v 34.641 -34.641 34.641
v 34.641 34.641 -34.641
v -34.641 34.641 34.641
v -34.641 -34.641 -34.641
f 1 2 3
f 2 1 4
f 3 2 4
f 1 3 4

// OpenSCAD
/*
  
   cubic system forms
   
   see http://kitwallace.tumblr.com/tagged/crystal 
   
   Kit Wallace October 2015
   
   doesnt work in Thiniverse customiser - preview is very small 
   
*/

form=5; // [0:cube,1:rhombic dodecahedron,2:tetrahexahedron,3:pentagonal dodecahedron,4:octahedron,5:tetrahedron,6:icositetrahedron,7:triakis tetrahedron,8:triakis octahedron,9:deltoid dodecahedron,10:hexakis octahedron,11:diakisdodecahedron,12:hexatetrahedron,13:pentagonal icositetrahedron,14:tetrahedral pentagonal dodecaheron]



/* [orientation] */
//experimentation needed since size varies with form
size=20; // [1:40] 

// basic functions

function flatten(l) = [ for (a = l) for (b = a) b ] ;

function vcontains(val,list) =
     search([val],list)[0] != [];
       
function distinct(list,dlist=[],i=0) =  // return only distinct items of list
      i==len(list)
         ? dlist
         : vcontains(list[i],dlist)
             ? distinct(list,dlist,i+1)
             : distinct(list,concat(dlist,[list[i]]),i+1)
      ;

function sum(list,i=0) =  
      i < len(list)
        ?  list[i] + sum(list,i+1)
        :  0;

// solid construction
  
module orient_to(centre, normal) {   
      translate(centre)
      rotate([0, 0, atan2(normal.y, normal.x)]) //rotation
      rotate([0, atan2(sqrt(pow(normal.x, 2)+pow(normal.y, 2)),normal.z), 0])
      children();
}

module face(normal, d=1, size=20) {
   orient_to([0,0,0],normal)
       translate([0,0, d + size/2])
            cube([10*size,10*size,size],center=true);
} 

module solid(faces,d=1,color="lightblue",size=5) {
 /* faces is a list of normals (Miller indices)
    d is either a scaler, the distance of each face from the origin or a list of distances, one for each face
 */  
 color(color)
    difference() {
     sphere(size,center=true);
     for(i = [0:len(faces)-1])  {
       face = faces[i];
       fd = len(d) == undef ? d : d[i];
       face(face,d=fd,size=size);
     }
 }
}

// functions to expand a form into faces using eg perms and combs

function perm3(l) =
// lazy until I code general perms with duplicates
 distinct(
   [[l[0],l[1],l[2]],
   [l[0],l[2],l[1]],
   [l[1],l[0],l[2]],
   [l[1],l[2],l[0]],
   [l[2],l[0],l[1]],
   [l[2],l[1],l[0]]
]);
        
function combs(list,n=0) =
   n < len(list)-1
   ? [for (j=list[n])
       for (sl= combs(list,n+1))
           concat(j,sl)
     ]
   : list[n] ;
 
       
function expand(list) =   
// needs a better name
  [for (x= list)
      x== 0 ? 0 : [x,-x]
  ];

// face generators
  
function shift(face,k=1) = [face[k%3],face[(k+1)%3],face[(k+2)%3]];
       
function cycle(face) =
    [face,shift(face,1),shift(face,2)];

function full_symmetry(form) =
   distinct(flatten([for (comb = combs(expand(form))) perm3(comb)]));
  
function tetra_symmetry(form) =
   distinct(flatten([for (face = [form,[form[1],form[0],form[2]]]) combs(expand(face))]));

function gyroid_symmetry(form,even=true) =
    concat(parity_filter(distinct(flatten([for (face = cycle(form)) combs(expand(face))])),even),
           parity_filter(distinct(flatten([for (face = cycle([form[0],form[2],-form[1]])) combs(expand(face))])), ! even)
    );

function opposite(face) =
   [for (a=face) 
       a==0 ? 0 : - a];

function mirror(face) =  [ face,opposite(face)];   

function switch(face) = [face[1],face[0],face[2]];

function trapezohedral_symmetry(form) =
 concat(
    parity_filter(combs(expand(form)),form),
    parity_filter(combs(expand(switch(form))),mirror(form))
    );

// bit of a hack - sb a filter
function rotate_z(form) = [-form[1],form[0],form[2]]; 
   
function rotate_z4(form) = 
   let (mform=[form[0],form[1],-form[2]])
   [form,
    rotate_z(form),
    rotate_z(rotate_z(form)),
    rotate_z(rotate_z(rotate_z(form))),
    mform,
    rotate_z(mform),
    rotate_z(rotate_z(mform)),
    rotate_z(rotate_z(rotate_z(mform))) 
   ];
   
 // filters
           
function parity(face) =
    let(parity = sum( [for (i=face) i > 0 ? 1 : 0]))
    parity % 2 == 0 ;
 
function parity_filter(faces,form) =
    [for (face=faces) if (parity(face) == parity(form) ) face]; 

function unsigned(face) = [abs(face[0]),abs(face[1]),abs(face[2])];

function same_order(form,face) = 
    form == face || form==shift(face) || form==shift(shift(face));

function order_filter(faces,form) =
    [for (face=faces) 
        if (same_order(unsigned(form),unsigned(face))) face
    ];

function hemi_filter(faces,axis,form) =
     let(asign=sign(form[axis]))
     [for (face=faces) 
          if(sign(face[abs(axis)])==asign) face
     ];
          
// face construction      
function filter_faces(form,faces,modifiers,i=0) =
    i < len(modifiers)
       ? let(filter=modifiers[i])
         let(filtered_faces =
             filter=="order"
             ? order_filter(faces,form)
             : filter=="parity" 
             ? parity_filter(faces,form)
             : filter=="hemiz"
             ? hemi_filter(faces,2,form)
             : faces)
         filter_faces(form,filtered_faces,modifiers,i+1)
       : faces;
          
function form_faces(form,base,modifiers) =
    let(base_faces = 
         base=="full" 
       ? full_symmetry(form)
       : base=="tetra" 
       ? tetra_symmetry(form)
       : base=="gyroid"
       ? gyroid_symmetry(form)
       : base=="trapezoid" 
       ? trapezohedral_symmetry(form)
       : base=="mirror"
       ? mirror(form)
       : base=="pedion"
       ? [form]
       : base=="rotate_z4"
       ? rotate_z4(form)
       : [form])
     let(faces = filter_faces(form,base_faces,modifiers) )
     faces;

// crystal rendering
COLORS=["lightpink","lime","aquamarine","khaki","silver","lightsalmon","lightgreen","orange","cadetblue","tan","chartreuse","violet"];

module c_render(crystal) {
    forms=crystal[1];
    intersection_for (i=[0:len(forms)-1]) 
       c_render_part(crystal,i);
}


module c_render_selected(crystal,ds) {
    forms=crystal[1];
    intersection_for (i=[0:len(forms)-1]) {
       if (ds[i] != 0) c_render_part(crystal,i,ds[i]);
           }
}

module c_render_part(crystal,k,ds,label=false) {
    data=crystal[0];
    forms=crystal[1];
    scale(data[1])  
      {
         form_spec=forms[k];     
         form=form_spec[0];
         d = ds==undef ? form_spec[1] : ds;
         base = form_spec[2] == "" || form_spec[2] == undef  ?  data[2] : form_spec[2];
         modifiers=form_spec[3] == undef ? [] : form_spec[3] ;  
         name = form_spec[4] == undef ? "" :   form_spec[4];     
         ci= k % len(COLORS);
         color = COLORS[ci]== undef ? "green" : COLORS[ci];
         faces=form_faces(form,base,modifiers);  
  //       echo(form_spec);
         if(label) color("black") {
             translate([0,0,-3.5]) rotate([45,0,25]) scale(0.05) text(name,halign="center",font="Georgia:style=Regular"   );
             translate([0,0,-4.5]) rotate([45,0,25]) scale(0.05) text(str(form),halign="center",font="Georgia:style=Regular"   );
         }
         echo(name,color,form,d,base,modifiers, len(faces),faces);
         solid(faces,d,color);      
      }  
}

// data
/*
   the data structure has the format:
       [header [form]*]
   header = [name,scale,default_base symmetry,class]
   form =[miller indices, d, base ("" = default_base), [modifiers], name]
   
*/
// Cubic system

cubic_system = [
    ["cubic system",[1,1,1], "full"],
    [
      [[1,0,0],1,"",[],"cube"],
      [[1,1,0],1,"",[],"rhombic dodecahedron"],
      [[1,2,0],1,"",[],"tetrahexahedron"],
      [[1,2,0],1,"",["order"],"pentagonal dodecahedron"],  
      [[1,1,1],1,"",[],"octahedron"],
      [[1,1,1],1,"",["parity"],"tetrahedron"],
      [[2,1,1],1,"",[],"icositetrahedron"],
      [[2,1,1],1,"",["parity"],"triakis tetrahedron"],
      [[2,2,1],1,"",[],"triakis octahedron"],
      [[2,2,1],1,"",["parity"],"deltoid dodecahedron"],
      [[3,2,1],1,"",[],"hexakis octahedron"],
      [[3,2,1],1,"",["order"],"diakisdodecahedron"],
      [[3,2,1],1,"",["parity"], "hexatetrahedron"],
      [[3,2,1],1,"gyroid",[], "pentagonal icositetrahedron"],
      [[3,2,1],1,"",["parity","order"],"tetrahedral pentagonal dodecaheron"]
    ]
];

scale(size)  c_render_part(cubic_system,form);
